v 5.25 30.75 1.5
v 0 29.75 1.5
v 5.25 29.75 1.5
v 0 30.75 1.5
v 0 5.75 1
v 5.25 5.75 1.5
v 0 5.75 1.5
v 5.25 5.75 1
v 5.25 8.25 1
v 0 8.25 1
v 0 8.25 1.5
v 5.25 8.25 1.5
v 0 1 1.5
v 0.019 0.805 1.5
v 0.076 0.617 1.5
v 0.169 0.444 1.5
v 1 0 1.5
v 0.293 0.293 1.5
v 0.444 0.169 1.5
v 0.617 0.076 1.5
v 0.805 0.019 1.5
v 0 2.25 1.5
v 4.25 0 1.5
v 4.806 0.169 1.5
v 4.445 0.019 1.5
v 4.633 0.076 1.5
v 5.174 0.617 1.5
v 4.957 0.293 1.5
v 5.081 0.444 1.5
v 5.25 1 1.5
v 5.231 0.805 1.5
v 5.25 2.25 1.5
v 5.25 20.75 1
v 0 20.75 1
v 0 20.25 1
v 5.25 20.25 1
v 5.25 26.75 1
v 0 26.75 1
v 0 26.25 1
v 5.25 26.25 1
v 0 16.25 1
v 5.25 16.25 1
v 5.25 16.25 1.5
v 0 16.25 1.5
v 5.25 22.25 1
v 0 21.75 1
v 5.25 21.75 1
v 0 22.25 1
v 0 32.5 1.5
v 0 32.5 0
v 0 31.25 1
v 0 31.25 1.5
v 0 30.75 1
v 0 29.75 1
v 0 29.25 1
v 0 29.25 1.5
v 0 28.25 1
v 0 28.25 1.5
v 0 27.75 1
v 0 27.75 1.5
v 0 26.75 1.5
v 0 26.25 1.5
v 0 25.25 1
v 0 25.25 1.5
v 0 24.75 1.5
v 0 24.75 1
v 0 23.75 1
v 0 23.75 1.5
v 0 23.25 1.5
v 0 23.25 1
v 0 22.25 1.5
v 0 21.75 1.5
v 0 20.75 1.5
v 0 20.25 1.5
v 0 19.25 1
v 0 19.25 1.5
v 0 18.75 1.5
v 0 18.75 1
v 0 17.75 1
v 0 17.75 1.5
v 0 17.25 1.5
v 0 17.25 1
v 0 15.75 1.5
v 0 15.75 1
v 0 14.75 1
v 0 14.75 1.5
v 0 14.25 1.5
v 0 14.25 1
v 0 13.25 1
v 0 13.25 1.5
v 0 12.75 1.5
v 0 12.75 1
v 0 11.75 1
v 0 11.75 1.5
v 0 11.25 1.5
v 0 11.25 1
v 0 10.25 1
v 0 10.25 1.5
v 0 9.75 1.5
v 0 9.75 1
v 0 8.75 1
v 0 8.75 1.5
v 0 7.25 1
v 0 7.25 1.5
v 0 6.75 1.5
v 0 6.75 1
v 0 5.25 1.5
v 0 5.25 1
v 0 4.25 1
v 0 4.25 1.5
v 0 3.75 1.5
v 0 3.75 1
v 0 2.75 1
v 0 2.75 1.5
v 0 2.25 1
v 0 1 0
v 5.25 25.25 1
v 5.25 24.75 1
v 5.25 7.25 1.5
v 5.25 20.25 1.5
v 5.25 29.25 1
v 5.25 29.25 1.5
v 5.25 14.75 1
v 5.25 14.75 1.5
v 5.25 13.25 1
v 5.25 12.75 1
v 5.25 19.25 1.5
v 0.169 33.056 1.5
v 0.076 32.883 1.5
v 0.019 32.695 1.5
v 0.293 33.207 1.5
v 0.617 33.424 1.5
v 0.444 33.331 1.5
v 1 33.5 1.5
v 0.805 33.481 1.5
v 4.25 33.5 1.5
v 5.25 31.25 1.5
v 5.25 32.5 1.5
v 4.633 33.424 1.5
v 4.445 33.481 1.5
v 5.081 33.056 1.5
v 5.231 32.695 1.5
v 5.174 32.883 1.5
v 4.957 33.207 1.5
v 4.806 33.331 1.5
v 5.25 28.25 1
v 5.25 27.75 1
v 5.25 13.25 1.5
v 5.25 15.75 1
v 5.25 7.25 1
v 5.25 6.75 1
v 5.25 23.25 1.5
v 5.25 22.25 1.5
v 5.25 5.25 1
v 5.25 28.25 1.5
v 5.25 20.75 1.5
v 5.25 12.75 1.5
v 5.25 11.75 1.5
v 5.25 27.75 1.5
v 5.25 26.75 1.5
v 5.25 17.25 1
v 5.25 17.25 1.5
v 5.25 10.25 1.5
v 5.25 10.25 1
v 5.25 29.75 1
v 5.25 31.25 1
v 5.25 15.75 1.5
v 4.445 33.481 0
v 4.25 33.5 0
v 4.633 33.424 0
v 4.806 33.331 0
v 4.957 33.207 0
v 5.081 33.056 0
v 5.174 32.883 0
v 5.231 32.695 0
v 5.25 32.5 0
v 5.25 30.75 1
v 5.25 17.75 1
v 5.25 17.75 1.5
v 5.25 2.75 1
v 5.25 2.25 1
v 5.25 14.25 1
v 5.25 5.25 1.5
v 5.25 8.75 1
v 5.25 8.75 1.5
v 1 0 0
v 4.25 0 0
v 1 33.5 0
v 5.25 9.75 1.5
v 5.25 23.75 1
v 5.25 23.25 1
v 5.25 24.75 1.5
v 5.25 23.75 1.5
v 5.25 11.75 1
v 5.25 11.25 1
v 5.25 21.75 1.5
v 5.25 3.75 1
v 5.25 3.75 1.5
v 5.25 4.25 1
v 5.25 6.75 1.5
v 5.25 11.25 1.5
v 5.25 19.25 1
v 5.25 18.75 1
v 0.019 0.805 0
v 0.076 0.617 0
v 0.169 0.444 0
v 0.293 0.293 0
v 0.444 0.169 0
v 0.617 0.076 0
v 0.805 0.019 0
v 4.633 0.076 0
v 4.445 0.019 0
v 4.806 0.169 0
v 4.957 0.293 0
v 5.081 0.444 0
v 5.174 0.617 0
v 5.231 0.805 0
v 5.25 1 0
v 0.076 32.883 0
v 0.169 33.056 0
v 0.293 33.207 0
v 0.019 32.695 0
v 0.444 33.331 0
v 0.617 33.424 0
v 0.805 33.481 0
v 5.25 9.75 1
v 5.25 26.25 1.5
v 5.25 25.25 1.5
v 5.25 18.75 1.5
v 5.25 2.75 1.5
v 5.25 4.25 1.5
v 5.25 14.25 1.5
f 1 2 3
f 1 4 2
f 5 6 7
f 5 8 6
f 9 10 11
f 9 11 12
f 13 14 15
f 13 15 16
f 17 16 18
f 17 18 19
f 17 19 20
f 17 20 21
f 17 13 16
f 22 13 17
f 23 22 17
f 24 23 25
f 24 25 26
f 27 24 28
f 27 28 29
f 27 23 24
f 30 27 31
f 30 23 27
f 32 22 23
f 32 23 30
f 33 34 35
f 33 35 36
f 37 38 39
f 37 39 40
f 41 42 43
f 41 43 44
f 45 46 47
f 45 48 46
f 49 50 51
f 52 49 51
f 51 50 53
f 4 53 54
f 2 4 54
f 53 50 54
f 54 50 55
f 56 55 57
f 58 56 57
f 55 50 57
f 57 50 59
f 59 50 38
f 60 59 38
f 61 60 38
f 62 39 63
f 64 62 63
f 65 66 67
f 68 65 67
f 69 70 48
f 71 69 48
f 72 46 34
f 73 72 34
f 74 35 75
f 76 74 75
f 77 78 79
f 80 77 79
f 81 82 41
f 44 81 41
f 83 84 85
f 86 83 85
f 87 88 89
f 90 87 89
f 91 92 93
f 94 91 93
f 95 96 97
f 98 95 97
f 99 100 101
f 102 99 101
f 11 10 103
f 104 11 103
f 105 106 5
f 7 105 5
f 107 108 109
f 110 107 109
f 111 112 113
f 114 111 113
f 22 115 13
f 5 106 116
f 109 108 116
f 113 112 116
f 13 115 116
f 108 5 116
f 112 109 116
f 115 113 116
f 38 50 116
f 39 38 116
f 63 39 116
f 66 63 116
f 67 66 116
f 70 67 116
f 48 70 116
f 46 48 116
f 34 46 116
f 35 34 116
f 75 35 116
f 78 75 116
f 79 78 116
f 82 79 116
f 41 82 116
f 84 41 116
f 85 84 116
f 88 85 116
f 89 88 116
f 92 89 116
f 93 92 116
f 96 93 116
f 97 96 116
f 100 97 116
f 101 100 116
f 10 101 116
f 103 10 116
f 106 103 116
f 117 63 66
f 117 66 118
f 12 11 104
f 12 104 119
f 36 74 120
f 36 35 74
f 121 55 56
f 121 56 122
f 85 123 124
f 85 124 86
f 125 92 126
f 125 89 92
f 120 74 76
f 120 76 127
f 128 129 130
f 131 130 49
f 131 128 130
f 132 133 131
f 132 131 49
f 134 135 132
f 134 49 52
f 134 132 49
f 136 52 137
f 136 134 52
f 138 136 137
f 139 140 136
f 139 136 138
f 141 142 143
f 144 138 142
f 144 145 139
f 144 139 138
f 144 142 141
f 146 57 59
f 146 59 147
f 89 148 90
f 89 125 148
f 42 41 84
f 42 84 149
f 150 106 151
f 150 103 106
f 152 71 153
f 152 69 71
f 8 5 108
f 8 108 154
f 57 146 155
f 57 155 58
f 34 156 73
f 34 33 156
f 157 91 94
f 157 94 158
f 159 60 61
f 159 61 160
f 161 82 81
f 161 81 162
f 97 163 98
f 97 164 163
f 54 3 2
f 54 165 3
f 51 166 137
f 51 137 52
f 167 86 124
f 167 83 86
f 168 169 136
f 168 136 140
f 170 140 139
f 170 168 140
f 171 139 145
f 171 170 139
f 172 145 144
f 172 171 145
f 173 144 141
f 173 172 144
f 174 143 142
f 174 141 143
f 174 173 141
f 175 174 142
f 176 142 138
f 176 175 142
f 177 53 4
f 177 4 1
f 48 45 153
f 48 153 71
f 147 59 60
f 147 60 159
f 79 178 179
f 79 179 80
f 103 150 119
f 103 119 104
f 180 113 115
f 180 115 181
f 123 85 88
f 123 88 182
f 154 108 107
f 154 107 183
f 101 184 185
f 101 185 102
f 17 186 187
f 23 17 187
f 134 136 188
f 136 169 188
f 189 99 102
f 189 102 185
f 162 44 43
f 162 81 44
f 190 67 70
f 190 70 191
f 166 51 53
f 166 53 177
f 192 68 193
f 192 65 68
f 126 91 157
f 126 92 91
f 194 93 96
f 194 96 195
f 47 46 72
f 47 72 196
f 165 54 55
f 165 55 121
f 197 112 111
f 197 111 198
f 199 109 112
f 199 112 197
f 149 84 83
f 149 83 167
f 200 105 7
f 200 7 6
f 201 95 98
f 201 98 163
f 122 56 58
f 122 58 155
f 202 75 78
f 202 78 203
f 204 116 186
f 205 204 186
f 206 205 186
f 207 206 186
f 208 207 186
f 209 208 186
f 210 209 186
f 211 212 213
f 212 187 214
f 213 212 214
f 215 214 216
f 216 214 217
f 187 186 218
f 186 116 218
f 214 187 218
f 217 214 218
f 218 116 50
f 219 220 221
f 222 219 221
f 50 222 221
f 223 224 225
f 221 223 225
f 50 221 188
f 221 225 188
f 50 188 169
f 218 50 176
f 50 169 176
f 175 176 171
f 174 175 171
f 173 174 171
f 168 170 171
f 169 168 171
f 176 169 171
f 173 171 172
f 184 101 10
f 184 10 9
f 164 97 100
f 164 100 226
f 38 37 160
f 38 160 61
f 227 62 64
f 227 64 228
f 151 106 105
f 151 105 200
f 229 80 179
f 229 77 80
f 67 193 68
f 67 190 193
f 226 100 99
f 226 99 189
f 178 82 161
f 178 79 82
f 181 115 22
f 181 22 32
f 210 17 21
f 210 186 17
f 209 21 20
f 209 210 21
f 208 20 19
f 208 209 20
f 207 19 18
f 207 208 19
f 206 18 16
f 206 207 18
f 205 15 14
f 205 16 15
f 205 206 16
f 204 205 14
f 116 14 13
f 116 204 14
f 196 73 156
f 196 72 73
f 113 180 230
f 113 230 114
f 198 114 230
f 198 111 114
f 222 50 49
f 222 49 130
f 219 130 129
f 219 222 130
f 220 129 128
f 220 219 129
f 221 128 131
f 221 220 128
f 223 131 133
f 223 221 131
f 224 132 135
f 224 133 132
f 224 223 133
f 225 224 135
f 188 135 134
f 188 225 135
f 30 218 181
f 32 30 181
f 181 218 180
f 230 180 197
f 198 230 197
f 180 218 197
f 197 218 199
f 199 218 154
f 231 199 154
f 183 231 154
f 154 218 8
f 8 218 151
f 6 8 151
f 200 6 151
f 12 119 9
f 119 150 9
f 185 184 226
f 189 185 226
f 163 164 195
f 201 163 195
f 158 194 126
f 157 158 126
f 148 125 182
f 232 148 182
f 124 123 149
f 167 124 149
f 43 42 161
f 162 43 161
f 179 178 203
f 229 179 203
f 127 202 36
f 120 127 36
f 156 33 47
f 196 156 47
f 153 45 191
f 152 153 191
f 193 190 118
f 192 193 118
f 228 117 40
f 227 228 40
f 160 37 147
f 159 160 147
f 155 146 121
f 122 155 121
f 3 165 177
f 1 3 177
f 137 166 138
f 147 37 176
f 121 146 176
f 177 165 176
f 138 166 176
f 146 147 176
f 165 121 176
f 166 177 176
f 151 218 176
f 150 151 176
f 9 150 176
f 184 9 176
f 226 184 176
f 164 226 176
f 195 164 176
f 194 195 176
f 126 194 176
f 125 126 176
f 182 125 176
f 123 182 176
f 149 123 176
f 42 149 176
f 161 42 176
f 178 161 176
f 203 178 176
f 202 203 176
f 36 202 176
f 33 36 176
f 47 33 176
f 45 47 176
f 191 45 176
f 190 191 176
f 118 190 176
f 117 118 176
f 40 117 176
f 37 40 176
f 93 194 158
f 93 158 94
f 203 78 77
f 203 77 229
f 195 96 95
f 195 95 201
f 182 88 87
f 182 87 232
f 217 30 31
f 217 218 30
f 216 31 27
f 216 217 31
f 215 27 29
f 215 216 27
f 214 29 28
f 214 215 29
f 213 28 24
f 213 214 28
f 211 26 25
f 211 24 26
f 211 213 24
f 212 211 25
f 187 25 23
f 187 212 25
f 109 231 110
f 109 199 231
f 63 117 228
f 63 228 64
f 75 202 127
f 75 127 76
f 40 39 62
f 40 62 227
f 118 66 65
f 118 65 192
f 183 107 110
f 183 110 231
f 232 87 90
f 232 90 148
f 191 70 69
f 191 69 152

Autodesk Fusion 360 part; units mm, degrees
sketch "Sketch1" plane through (0, 0, 0) normal (0, 0, 1) x (1, 0, 0)
  line L0 (1, 0) -> (4.25, 0)
  line L1 (5.25, 1) -> (5.25, 32.5)
  line L2 (4.25, 33.5) -> (1, 33.5)
  line L3 (0, 32.5) -> (0, 1)
  arc A0 (1, 33.5) -> (0, 32.5) centre (1, 32.5) ccw
  arc A1 (5.25, 32.5) -> (4.25, 33.5) centre (4.25, 32.5) ccw
  arc A2 (4.25, 0) -> (5.25, 1) centre (4.25, 1) ccw
  arc A3 (0, 1) -> (1, 0) centre (1, 1) ccw
  line L4 (0, 1) -> (5.25, 1) construction
  line L5 (0, 32.5) -> (5.25, 32.5) construction
  line L6 (2.625, 32.5) -> (2.625, 1) construction
  line L7 (0, 32.25) -> (5.25, 32.25)
  line L8 (5.25, 32.25) -> (5.25, 31.25)
  line L9 (5.25, 31.25) -> (0, 31.25)
  line L10 (0, 31.25) -> (0, 32.25)
  line L11 (2.625, 32.5) -> (2.625, 32.25) construction
  line L12 (2.625, 1) -> (2.625, 1.42) construction
  line L13 (2.625, 31.25) -> (2.625, 30.75) construction
  line L14 (5.25, 25.25) -> (0, 25.25)
  line L15 (0, 25.25) -> (0, 26.25)
  line L16 (5.25, 26.25) -> (5.25, 25.25)
  line L17 (2.625, 25.25) -> (2.625, 24.75) construction
  line L18 (0, 26.25) -> (5.25, 26.25)
  line L19 (0, 16.25) -> (0, 17.25)
  line L20 (5.25, 17.25) -> (5.25, 16.25)
  line L21 (0, 17.25) -> (5.25, 17.25)
  line L22 (2.625, 16.25) -> (2.625, 15.75) construction
  line L23 (5.25, 16.25) -> (0, 16.25)
  line L24 (0, 7.25) -> (0, 8.25)
  line L25 (5.25, 8.25) -> (5.25, 7.25)
  line L26 (0, 8.25) -> (5.25, 8.25)
  line L27 (2.625, 7.25) -> (2.625, 6.75) construction
  line L28 (5.25, 7.25) -> (0, 7.25)
  line L29 (0, 26.75) -> (0, 27.75)
  line L30 (5.25, 27.75) -> (5.25, 26.75)
  line L31 (0, 27.75) -> (5.25, 27.75)
  line L32 (2.625, 26.75) -> (2.625, 26.25) construction
  line L33 (5.25, 26.75) -> (0, 26.75)
  line L34 (0, 22.25) -> (0, 23.25)
  line L35 (5.25, 23.25) -> (5.25, 22.25)
  line L36 (0, 23.25) -> (5.25, 23.25)
  line L37 (2.625, 22.25) -> (2.625, 21.75) construction
  line L38 (5.25, 22.25) -> (0, 22.25)
  line L39 (0, 28.25) -> (0, 29.25)
  line L40 (5.25, 29.25) -> (5.25, 28.25)
  line L41 (0, 29.25) -> (5.25, 29.25)
  line L42 (2.625, 28.25) -> (2.625, 27.75) construction
  line L43 (5.25, 28.25) -> (0, 28.25)
  line L44 (0, 13.25) -> (0, 14.25)
  line L45 (5.25, 14.25) -> (5.25, 13.25)
  line L46 (0, 14.25) -> (5.25, 14.25)
  line L47 (2.625, 13.25) -> (2.625, 12.75) construction
  line L48 (5.25, 13.25) -> (0, 13.25)
  line L49 (0, 10.25) -> (0, 11.25)
  line L50 (5.25, 11.25) -> (5.25, 10.25)
  line L51 (0, 11.25) -> (5.25, 11.25)
  line L52 (2.625, 10.25) -> (2.625, 9.75) construction
  line L53 (5.25, 10.25) -> (0, 10.25)
  line L54 (0, 11.75) -> (0, 12.75)
  line L55 (5.25, 12.75) -> (5.25, 11.75)
  line L56 (0, 12.75) -> (5.25, 12.75)
  line L57 (2.625, 11.75) -> (2.625, 11.25) construction
  line L58 (5.25, 11.75) -> (0, 11.75)
  line L59 (0, 5.75) -> (0, 6.75)
  line L60 (5.25, 6.75) -> (5.25, 5.75)
  line L61 (0, 6.75) -> (5.25, 6.75)
  line L62 (2.625, 5.75) -> (2.625, 5.25) construction
  line L63 (5.25, 5.75) -> (0, 5.75)
  line L64 (0, 17.75) -> (0, 18.75)
  line L65 (5.25, 18.75) -> (5.25, 17.75)
  line L66 (0, 18.75) -> (5.25, 18.75)
  line L67 (2.625, 17.75) -> (2.625, 17.25) construction
  line L68 (5.25, 17.75) -> (0, 17.75)
  line L69 (0, 8.75) -> (0, 9.75)
  line L70 (5.25, 9.75) -> (5.25, 8.75)
  line L71 (0, 9.75) -> (5.25, 9.75)
  line L72 (2.625, 8.75) -> (2.625, 8.25) construction
  line L73 (5.25, 8.75) -> (0, 8.75)
  line L74 (0, 29.75) -> (0, 30.75)
  line L75 (5.25, 30.75) -> (5.25, 29.75)
  line L76 (0, 30.75) -> (5.25, 30.75)
  line L77 (2.625, 29.75) -> (2.625, 29.25) construction
  line L78 (5.25, 29.75) -> (0, 29.75)
  line L79 (0, 14.75) -> (0, 15.75)
  line L80 (5.25, 15.75) -> (5.25, 14.75)
  line L81 (0, 15.75) -> (5.25, 15.75)
  line L82 (2.625, 14.75) -> (2.625, 14.25) construction
  line L83 (5.25, 14.75) -> (0, 14.75)
  line L84 (0, 19.25) -> (0, 20.25)
  line L85 (5.25, 20.25) -> (5.25, 19.25)
  line L86 (0, 20.25) -> (5.25, 20.25)
  line L87 (2.625, 19.25) -> (2.625, 18.75) construction
  line L88 (5.25, 19.25) -> (0, 19.25)
  line L89 (0, 23.75) -> (0, 24.75)
  line L90 (5.25, 24.75) -> (5.25, 23.75)
  line L91 (0, 24.75) -> (5.25, 24.75)
  line L92 (2.625, 23.75) -> (2.625, 23.25) construction
  line L93 (5.25, 23.75) -> (0, 23.75)
  line L94 (0, 20.75) -> (0, 21.75)
  line L95 (5.25, 21.75) -> (5.25, 20.75)
  line L96 (0, 21.75) -> (5.25, 21.75)
  line L97 (2.625, 20.75) -> (2.625, 20.25) construction
  line L98 (5.25, 20.75) -> (0, 20.75)
  line L99 (0, 4.25) -> (0, 5.25)
  line L100 (5.25, 5.25) -> (5.25, 4.25)
  line L101 (0, 5.25) -> (5.25, 5.25)
  line L102 (2.625, 4.25) -> (2.625, 3.75) construction
  line L103 (5.25, 4.25) -> (0, 4.25)
  line L104 (0, 2.25) -> (5.25, 2.25)
  line L105 (0, 1.25) -> (0, 2.25)
  line L106 (5.25, 1.25) -> (0, 1.25)
  line L107 (2.625, 1.25) -> (2.625, 0.75) construction
  line L108 (5.25, 2.25) -> (5.25, 1.25)
  line L109 (5.25, 2.75) -> (0, 2.75)
  line L110 (5.25, 3.75) -> (5.25, 2.75)
  line L111 (0, 3.75) -> (5.25, 3.75)
  line L112 (2.625, 2.75) -> (2.625, 2.25) construction
  line L113 (0, 2.75) -> (0, 3.75)
  line L114 (2.625, 0) -> (7.625, 0) construction
  line L115 (2.625, 33.5) -> (7.625, 33.5) construction
  line L116 (7.625, 33.5) -> (7.625, 0) construction
  line L117 (7.625, 16.75) -> (5.25, 16.75) construction
  line L118 (5.25, 16.75) -> (2.625, 16.75) construction
  point P0 (5.25, 0)
  point P1 (0, 33.5)
  dimension "d1" = 5.25
  dimension "d2" = 33.5
  dimension "d3" = 1
  dimension "d4" = 1
  dimension "d5" = 5.25
  dimension "d6" = 0.25
  dimension "d7" = 0.42
  dimension "d8" = 0.5
  dimension "d9" = 1
  dimension "d10" = 5.25
  dimension "d11" = 0.5
  dimension "d12" = 1
  dimension "d13" = 5.25
  dimension "d14" = 0.5
  dimension "d15" = 1
  dimension "d16" = 5.25
  dimension "d17" = 0.5
  dimension "d18" = 1
  dimension "d19" = 5.25
  dimension "d20" = 0.5
  dimension "d21" = 1
  dimension "d22" = 5.25
  dimension "d23" = 0.5
  dimension "d24" = 1
  dimension "d25" = 5.25
  dimension "d26" = 0.5
  dimension "d27" = 1
  dimension "d28" = 5.25
  dimension "d29" = 0.5
  dimension "d30" = 1
  dimension "d31" = 5.25
  dimension "d32" = 0.5
  dimension "d33" = 1
  dimension "d34" = 5.25
  dimension "d35" = 0.5
  dimension "d36" = 1
  dimension "d37" = 5.25
  dimension "d38" = 0.5
  dimension "d39" = 1
  dimension "d40" = 5.25
  dimension "d41" = 0.5
  dimension "d42" = 1
  dimension "d43" = 5.25
  dimension "d44" = 0.5
  dimension "d45" = 1
  dimension "d46" = 5.25
  dimension "d47" = 0.5
  dimension "d48" = 1
  dimension "d49" = 5.25
  dimension "d50" = 0.5
  dimension "d51" = 1
  dimension "d52" = 5.25
  dimension "d53" = 0.5
  dimension "d54" = 1
  dimension "d55" = 5.25
  dimension "d56" = 0.5
  dimension "d57" = 1
  dimension "d58" = 5.25
  dimension "d59" = 0.5
  dimension "d60" = 1
  dimension "d61" = 5.25
  dimension "d62" = 0.5
  dimension "d63" = 1
  dimension "d64" = 5.25
  dimension "d65" = 0.5
  dimension "d72" = 1
  dimension "d73" = 5.25
  dimension "d74" = 0.5
  dimension "d79" = 5
  dimension "d80" = 5
extrude "Extrude1" add sketch "Sketch1" along normal blind 1
extrude "Extrude2" add sketch "Sketch1" along normal blind 1.5 contours L0 L1 L3 A2 A3 L106 | L1 L3 L104 L105 L106 L108 | L1 L3 L109 L110 L111 L113 | L1 L3 L99 L100 L101 L103 | L1 L3 L59 L60 L61 L63 | L1 L3 L24 L25 L26 L28 | L1 L3 L69 L70 L71 L73 | L1 L3 L49 L50 L51 L53 | L1 L3 L54 L55 L56 L58 | L1 L3 L44 L45 L46 L48 | L1 L3 L79 L80 L81 L83 | L1 L3 L19 L20 L21 L23 | L1 L3 L64 L65 L66 L68 | L1 L3 L84 L85 L86 L88 | L1 L3 L94 L95 L96 L98 | L1 L3 L34 L35 L36 L38 | L1 L3 L89 L90 L91 L93 | L1 L3 L14 L15 L16 L18 | L1 L3 L29 L30 L31 L33 | L1 L3 L39 L40 L41 L43 | L1 L3 L74 L75 L76 L78 | L1 L3 L7 L8 L9 L10 | L1 L2 L3 A0 A1 L7
